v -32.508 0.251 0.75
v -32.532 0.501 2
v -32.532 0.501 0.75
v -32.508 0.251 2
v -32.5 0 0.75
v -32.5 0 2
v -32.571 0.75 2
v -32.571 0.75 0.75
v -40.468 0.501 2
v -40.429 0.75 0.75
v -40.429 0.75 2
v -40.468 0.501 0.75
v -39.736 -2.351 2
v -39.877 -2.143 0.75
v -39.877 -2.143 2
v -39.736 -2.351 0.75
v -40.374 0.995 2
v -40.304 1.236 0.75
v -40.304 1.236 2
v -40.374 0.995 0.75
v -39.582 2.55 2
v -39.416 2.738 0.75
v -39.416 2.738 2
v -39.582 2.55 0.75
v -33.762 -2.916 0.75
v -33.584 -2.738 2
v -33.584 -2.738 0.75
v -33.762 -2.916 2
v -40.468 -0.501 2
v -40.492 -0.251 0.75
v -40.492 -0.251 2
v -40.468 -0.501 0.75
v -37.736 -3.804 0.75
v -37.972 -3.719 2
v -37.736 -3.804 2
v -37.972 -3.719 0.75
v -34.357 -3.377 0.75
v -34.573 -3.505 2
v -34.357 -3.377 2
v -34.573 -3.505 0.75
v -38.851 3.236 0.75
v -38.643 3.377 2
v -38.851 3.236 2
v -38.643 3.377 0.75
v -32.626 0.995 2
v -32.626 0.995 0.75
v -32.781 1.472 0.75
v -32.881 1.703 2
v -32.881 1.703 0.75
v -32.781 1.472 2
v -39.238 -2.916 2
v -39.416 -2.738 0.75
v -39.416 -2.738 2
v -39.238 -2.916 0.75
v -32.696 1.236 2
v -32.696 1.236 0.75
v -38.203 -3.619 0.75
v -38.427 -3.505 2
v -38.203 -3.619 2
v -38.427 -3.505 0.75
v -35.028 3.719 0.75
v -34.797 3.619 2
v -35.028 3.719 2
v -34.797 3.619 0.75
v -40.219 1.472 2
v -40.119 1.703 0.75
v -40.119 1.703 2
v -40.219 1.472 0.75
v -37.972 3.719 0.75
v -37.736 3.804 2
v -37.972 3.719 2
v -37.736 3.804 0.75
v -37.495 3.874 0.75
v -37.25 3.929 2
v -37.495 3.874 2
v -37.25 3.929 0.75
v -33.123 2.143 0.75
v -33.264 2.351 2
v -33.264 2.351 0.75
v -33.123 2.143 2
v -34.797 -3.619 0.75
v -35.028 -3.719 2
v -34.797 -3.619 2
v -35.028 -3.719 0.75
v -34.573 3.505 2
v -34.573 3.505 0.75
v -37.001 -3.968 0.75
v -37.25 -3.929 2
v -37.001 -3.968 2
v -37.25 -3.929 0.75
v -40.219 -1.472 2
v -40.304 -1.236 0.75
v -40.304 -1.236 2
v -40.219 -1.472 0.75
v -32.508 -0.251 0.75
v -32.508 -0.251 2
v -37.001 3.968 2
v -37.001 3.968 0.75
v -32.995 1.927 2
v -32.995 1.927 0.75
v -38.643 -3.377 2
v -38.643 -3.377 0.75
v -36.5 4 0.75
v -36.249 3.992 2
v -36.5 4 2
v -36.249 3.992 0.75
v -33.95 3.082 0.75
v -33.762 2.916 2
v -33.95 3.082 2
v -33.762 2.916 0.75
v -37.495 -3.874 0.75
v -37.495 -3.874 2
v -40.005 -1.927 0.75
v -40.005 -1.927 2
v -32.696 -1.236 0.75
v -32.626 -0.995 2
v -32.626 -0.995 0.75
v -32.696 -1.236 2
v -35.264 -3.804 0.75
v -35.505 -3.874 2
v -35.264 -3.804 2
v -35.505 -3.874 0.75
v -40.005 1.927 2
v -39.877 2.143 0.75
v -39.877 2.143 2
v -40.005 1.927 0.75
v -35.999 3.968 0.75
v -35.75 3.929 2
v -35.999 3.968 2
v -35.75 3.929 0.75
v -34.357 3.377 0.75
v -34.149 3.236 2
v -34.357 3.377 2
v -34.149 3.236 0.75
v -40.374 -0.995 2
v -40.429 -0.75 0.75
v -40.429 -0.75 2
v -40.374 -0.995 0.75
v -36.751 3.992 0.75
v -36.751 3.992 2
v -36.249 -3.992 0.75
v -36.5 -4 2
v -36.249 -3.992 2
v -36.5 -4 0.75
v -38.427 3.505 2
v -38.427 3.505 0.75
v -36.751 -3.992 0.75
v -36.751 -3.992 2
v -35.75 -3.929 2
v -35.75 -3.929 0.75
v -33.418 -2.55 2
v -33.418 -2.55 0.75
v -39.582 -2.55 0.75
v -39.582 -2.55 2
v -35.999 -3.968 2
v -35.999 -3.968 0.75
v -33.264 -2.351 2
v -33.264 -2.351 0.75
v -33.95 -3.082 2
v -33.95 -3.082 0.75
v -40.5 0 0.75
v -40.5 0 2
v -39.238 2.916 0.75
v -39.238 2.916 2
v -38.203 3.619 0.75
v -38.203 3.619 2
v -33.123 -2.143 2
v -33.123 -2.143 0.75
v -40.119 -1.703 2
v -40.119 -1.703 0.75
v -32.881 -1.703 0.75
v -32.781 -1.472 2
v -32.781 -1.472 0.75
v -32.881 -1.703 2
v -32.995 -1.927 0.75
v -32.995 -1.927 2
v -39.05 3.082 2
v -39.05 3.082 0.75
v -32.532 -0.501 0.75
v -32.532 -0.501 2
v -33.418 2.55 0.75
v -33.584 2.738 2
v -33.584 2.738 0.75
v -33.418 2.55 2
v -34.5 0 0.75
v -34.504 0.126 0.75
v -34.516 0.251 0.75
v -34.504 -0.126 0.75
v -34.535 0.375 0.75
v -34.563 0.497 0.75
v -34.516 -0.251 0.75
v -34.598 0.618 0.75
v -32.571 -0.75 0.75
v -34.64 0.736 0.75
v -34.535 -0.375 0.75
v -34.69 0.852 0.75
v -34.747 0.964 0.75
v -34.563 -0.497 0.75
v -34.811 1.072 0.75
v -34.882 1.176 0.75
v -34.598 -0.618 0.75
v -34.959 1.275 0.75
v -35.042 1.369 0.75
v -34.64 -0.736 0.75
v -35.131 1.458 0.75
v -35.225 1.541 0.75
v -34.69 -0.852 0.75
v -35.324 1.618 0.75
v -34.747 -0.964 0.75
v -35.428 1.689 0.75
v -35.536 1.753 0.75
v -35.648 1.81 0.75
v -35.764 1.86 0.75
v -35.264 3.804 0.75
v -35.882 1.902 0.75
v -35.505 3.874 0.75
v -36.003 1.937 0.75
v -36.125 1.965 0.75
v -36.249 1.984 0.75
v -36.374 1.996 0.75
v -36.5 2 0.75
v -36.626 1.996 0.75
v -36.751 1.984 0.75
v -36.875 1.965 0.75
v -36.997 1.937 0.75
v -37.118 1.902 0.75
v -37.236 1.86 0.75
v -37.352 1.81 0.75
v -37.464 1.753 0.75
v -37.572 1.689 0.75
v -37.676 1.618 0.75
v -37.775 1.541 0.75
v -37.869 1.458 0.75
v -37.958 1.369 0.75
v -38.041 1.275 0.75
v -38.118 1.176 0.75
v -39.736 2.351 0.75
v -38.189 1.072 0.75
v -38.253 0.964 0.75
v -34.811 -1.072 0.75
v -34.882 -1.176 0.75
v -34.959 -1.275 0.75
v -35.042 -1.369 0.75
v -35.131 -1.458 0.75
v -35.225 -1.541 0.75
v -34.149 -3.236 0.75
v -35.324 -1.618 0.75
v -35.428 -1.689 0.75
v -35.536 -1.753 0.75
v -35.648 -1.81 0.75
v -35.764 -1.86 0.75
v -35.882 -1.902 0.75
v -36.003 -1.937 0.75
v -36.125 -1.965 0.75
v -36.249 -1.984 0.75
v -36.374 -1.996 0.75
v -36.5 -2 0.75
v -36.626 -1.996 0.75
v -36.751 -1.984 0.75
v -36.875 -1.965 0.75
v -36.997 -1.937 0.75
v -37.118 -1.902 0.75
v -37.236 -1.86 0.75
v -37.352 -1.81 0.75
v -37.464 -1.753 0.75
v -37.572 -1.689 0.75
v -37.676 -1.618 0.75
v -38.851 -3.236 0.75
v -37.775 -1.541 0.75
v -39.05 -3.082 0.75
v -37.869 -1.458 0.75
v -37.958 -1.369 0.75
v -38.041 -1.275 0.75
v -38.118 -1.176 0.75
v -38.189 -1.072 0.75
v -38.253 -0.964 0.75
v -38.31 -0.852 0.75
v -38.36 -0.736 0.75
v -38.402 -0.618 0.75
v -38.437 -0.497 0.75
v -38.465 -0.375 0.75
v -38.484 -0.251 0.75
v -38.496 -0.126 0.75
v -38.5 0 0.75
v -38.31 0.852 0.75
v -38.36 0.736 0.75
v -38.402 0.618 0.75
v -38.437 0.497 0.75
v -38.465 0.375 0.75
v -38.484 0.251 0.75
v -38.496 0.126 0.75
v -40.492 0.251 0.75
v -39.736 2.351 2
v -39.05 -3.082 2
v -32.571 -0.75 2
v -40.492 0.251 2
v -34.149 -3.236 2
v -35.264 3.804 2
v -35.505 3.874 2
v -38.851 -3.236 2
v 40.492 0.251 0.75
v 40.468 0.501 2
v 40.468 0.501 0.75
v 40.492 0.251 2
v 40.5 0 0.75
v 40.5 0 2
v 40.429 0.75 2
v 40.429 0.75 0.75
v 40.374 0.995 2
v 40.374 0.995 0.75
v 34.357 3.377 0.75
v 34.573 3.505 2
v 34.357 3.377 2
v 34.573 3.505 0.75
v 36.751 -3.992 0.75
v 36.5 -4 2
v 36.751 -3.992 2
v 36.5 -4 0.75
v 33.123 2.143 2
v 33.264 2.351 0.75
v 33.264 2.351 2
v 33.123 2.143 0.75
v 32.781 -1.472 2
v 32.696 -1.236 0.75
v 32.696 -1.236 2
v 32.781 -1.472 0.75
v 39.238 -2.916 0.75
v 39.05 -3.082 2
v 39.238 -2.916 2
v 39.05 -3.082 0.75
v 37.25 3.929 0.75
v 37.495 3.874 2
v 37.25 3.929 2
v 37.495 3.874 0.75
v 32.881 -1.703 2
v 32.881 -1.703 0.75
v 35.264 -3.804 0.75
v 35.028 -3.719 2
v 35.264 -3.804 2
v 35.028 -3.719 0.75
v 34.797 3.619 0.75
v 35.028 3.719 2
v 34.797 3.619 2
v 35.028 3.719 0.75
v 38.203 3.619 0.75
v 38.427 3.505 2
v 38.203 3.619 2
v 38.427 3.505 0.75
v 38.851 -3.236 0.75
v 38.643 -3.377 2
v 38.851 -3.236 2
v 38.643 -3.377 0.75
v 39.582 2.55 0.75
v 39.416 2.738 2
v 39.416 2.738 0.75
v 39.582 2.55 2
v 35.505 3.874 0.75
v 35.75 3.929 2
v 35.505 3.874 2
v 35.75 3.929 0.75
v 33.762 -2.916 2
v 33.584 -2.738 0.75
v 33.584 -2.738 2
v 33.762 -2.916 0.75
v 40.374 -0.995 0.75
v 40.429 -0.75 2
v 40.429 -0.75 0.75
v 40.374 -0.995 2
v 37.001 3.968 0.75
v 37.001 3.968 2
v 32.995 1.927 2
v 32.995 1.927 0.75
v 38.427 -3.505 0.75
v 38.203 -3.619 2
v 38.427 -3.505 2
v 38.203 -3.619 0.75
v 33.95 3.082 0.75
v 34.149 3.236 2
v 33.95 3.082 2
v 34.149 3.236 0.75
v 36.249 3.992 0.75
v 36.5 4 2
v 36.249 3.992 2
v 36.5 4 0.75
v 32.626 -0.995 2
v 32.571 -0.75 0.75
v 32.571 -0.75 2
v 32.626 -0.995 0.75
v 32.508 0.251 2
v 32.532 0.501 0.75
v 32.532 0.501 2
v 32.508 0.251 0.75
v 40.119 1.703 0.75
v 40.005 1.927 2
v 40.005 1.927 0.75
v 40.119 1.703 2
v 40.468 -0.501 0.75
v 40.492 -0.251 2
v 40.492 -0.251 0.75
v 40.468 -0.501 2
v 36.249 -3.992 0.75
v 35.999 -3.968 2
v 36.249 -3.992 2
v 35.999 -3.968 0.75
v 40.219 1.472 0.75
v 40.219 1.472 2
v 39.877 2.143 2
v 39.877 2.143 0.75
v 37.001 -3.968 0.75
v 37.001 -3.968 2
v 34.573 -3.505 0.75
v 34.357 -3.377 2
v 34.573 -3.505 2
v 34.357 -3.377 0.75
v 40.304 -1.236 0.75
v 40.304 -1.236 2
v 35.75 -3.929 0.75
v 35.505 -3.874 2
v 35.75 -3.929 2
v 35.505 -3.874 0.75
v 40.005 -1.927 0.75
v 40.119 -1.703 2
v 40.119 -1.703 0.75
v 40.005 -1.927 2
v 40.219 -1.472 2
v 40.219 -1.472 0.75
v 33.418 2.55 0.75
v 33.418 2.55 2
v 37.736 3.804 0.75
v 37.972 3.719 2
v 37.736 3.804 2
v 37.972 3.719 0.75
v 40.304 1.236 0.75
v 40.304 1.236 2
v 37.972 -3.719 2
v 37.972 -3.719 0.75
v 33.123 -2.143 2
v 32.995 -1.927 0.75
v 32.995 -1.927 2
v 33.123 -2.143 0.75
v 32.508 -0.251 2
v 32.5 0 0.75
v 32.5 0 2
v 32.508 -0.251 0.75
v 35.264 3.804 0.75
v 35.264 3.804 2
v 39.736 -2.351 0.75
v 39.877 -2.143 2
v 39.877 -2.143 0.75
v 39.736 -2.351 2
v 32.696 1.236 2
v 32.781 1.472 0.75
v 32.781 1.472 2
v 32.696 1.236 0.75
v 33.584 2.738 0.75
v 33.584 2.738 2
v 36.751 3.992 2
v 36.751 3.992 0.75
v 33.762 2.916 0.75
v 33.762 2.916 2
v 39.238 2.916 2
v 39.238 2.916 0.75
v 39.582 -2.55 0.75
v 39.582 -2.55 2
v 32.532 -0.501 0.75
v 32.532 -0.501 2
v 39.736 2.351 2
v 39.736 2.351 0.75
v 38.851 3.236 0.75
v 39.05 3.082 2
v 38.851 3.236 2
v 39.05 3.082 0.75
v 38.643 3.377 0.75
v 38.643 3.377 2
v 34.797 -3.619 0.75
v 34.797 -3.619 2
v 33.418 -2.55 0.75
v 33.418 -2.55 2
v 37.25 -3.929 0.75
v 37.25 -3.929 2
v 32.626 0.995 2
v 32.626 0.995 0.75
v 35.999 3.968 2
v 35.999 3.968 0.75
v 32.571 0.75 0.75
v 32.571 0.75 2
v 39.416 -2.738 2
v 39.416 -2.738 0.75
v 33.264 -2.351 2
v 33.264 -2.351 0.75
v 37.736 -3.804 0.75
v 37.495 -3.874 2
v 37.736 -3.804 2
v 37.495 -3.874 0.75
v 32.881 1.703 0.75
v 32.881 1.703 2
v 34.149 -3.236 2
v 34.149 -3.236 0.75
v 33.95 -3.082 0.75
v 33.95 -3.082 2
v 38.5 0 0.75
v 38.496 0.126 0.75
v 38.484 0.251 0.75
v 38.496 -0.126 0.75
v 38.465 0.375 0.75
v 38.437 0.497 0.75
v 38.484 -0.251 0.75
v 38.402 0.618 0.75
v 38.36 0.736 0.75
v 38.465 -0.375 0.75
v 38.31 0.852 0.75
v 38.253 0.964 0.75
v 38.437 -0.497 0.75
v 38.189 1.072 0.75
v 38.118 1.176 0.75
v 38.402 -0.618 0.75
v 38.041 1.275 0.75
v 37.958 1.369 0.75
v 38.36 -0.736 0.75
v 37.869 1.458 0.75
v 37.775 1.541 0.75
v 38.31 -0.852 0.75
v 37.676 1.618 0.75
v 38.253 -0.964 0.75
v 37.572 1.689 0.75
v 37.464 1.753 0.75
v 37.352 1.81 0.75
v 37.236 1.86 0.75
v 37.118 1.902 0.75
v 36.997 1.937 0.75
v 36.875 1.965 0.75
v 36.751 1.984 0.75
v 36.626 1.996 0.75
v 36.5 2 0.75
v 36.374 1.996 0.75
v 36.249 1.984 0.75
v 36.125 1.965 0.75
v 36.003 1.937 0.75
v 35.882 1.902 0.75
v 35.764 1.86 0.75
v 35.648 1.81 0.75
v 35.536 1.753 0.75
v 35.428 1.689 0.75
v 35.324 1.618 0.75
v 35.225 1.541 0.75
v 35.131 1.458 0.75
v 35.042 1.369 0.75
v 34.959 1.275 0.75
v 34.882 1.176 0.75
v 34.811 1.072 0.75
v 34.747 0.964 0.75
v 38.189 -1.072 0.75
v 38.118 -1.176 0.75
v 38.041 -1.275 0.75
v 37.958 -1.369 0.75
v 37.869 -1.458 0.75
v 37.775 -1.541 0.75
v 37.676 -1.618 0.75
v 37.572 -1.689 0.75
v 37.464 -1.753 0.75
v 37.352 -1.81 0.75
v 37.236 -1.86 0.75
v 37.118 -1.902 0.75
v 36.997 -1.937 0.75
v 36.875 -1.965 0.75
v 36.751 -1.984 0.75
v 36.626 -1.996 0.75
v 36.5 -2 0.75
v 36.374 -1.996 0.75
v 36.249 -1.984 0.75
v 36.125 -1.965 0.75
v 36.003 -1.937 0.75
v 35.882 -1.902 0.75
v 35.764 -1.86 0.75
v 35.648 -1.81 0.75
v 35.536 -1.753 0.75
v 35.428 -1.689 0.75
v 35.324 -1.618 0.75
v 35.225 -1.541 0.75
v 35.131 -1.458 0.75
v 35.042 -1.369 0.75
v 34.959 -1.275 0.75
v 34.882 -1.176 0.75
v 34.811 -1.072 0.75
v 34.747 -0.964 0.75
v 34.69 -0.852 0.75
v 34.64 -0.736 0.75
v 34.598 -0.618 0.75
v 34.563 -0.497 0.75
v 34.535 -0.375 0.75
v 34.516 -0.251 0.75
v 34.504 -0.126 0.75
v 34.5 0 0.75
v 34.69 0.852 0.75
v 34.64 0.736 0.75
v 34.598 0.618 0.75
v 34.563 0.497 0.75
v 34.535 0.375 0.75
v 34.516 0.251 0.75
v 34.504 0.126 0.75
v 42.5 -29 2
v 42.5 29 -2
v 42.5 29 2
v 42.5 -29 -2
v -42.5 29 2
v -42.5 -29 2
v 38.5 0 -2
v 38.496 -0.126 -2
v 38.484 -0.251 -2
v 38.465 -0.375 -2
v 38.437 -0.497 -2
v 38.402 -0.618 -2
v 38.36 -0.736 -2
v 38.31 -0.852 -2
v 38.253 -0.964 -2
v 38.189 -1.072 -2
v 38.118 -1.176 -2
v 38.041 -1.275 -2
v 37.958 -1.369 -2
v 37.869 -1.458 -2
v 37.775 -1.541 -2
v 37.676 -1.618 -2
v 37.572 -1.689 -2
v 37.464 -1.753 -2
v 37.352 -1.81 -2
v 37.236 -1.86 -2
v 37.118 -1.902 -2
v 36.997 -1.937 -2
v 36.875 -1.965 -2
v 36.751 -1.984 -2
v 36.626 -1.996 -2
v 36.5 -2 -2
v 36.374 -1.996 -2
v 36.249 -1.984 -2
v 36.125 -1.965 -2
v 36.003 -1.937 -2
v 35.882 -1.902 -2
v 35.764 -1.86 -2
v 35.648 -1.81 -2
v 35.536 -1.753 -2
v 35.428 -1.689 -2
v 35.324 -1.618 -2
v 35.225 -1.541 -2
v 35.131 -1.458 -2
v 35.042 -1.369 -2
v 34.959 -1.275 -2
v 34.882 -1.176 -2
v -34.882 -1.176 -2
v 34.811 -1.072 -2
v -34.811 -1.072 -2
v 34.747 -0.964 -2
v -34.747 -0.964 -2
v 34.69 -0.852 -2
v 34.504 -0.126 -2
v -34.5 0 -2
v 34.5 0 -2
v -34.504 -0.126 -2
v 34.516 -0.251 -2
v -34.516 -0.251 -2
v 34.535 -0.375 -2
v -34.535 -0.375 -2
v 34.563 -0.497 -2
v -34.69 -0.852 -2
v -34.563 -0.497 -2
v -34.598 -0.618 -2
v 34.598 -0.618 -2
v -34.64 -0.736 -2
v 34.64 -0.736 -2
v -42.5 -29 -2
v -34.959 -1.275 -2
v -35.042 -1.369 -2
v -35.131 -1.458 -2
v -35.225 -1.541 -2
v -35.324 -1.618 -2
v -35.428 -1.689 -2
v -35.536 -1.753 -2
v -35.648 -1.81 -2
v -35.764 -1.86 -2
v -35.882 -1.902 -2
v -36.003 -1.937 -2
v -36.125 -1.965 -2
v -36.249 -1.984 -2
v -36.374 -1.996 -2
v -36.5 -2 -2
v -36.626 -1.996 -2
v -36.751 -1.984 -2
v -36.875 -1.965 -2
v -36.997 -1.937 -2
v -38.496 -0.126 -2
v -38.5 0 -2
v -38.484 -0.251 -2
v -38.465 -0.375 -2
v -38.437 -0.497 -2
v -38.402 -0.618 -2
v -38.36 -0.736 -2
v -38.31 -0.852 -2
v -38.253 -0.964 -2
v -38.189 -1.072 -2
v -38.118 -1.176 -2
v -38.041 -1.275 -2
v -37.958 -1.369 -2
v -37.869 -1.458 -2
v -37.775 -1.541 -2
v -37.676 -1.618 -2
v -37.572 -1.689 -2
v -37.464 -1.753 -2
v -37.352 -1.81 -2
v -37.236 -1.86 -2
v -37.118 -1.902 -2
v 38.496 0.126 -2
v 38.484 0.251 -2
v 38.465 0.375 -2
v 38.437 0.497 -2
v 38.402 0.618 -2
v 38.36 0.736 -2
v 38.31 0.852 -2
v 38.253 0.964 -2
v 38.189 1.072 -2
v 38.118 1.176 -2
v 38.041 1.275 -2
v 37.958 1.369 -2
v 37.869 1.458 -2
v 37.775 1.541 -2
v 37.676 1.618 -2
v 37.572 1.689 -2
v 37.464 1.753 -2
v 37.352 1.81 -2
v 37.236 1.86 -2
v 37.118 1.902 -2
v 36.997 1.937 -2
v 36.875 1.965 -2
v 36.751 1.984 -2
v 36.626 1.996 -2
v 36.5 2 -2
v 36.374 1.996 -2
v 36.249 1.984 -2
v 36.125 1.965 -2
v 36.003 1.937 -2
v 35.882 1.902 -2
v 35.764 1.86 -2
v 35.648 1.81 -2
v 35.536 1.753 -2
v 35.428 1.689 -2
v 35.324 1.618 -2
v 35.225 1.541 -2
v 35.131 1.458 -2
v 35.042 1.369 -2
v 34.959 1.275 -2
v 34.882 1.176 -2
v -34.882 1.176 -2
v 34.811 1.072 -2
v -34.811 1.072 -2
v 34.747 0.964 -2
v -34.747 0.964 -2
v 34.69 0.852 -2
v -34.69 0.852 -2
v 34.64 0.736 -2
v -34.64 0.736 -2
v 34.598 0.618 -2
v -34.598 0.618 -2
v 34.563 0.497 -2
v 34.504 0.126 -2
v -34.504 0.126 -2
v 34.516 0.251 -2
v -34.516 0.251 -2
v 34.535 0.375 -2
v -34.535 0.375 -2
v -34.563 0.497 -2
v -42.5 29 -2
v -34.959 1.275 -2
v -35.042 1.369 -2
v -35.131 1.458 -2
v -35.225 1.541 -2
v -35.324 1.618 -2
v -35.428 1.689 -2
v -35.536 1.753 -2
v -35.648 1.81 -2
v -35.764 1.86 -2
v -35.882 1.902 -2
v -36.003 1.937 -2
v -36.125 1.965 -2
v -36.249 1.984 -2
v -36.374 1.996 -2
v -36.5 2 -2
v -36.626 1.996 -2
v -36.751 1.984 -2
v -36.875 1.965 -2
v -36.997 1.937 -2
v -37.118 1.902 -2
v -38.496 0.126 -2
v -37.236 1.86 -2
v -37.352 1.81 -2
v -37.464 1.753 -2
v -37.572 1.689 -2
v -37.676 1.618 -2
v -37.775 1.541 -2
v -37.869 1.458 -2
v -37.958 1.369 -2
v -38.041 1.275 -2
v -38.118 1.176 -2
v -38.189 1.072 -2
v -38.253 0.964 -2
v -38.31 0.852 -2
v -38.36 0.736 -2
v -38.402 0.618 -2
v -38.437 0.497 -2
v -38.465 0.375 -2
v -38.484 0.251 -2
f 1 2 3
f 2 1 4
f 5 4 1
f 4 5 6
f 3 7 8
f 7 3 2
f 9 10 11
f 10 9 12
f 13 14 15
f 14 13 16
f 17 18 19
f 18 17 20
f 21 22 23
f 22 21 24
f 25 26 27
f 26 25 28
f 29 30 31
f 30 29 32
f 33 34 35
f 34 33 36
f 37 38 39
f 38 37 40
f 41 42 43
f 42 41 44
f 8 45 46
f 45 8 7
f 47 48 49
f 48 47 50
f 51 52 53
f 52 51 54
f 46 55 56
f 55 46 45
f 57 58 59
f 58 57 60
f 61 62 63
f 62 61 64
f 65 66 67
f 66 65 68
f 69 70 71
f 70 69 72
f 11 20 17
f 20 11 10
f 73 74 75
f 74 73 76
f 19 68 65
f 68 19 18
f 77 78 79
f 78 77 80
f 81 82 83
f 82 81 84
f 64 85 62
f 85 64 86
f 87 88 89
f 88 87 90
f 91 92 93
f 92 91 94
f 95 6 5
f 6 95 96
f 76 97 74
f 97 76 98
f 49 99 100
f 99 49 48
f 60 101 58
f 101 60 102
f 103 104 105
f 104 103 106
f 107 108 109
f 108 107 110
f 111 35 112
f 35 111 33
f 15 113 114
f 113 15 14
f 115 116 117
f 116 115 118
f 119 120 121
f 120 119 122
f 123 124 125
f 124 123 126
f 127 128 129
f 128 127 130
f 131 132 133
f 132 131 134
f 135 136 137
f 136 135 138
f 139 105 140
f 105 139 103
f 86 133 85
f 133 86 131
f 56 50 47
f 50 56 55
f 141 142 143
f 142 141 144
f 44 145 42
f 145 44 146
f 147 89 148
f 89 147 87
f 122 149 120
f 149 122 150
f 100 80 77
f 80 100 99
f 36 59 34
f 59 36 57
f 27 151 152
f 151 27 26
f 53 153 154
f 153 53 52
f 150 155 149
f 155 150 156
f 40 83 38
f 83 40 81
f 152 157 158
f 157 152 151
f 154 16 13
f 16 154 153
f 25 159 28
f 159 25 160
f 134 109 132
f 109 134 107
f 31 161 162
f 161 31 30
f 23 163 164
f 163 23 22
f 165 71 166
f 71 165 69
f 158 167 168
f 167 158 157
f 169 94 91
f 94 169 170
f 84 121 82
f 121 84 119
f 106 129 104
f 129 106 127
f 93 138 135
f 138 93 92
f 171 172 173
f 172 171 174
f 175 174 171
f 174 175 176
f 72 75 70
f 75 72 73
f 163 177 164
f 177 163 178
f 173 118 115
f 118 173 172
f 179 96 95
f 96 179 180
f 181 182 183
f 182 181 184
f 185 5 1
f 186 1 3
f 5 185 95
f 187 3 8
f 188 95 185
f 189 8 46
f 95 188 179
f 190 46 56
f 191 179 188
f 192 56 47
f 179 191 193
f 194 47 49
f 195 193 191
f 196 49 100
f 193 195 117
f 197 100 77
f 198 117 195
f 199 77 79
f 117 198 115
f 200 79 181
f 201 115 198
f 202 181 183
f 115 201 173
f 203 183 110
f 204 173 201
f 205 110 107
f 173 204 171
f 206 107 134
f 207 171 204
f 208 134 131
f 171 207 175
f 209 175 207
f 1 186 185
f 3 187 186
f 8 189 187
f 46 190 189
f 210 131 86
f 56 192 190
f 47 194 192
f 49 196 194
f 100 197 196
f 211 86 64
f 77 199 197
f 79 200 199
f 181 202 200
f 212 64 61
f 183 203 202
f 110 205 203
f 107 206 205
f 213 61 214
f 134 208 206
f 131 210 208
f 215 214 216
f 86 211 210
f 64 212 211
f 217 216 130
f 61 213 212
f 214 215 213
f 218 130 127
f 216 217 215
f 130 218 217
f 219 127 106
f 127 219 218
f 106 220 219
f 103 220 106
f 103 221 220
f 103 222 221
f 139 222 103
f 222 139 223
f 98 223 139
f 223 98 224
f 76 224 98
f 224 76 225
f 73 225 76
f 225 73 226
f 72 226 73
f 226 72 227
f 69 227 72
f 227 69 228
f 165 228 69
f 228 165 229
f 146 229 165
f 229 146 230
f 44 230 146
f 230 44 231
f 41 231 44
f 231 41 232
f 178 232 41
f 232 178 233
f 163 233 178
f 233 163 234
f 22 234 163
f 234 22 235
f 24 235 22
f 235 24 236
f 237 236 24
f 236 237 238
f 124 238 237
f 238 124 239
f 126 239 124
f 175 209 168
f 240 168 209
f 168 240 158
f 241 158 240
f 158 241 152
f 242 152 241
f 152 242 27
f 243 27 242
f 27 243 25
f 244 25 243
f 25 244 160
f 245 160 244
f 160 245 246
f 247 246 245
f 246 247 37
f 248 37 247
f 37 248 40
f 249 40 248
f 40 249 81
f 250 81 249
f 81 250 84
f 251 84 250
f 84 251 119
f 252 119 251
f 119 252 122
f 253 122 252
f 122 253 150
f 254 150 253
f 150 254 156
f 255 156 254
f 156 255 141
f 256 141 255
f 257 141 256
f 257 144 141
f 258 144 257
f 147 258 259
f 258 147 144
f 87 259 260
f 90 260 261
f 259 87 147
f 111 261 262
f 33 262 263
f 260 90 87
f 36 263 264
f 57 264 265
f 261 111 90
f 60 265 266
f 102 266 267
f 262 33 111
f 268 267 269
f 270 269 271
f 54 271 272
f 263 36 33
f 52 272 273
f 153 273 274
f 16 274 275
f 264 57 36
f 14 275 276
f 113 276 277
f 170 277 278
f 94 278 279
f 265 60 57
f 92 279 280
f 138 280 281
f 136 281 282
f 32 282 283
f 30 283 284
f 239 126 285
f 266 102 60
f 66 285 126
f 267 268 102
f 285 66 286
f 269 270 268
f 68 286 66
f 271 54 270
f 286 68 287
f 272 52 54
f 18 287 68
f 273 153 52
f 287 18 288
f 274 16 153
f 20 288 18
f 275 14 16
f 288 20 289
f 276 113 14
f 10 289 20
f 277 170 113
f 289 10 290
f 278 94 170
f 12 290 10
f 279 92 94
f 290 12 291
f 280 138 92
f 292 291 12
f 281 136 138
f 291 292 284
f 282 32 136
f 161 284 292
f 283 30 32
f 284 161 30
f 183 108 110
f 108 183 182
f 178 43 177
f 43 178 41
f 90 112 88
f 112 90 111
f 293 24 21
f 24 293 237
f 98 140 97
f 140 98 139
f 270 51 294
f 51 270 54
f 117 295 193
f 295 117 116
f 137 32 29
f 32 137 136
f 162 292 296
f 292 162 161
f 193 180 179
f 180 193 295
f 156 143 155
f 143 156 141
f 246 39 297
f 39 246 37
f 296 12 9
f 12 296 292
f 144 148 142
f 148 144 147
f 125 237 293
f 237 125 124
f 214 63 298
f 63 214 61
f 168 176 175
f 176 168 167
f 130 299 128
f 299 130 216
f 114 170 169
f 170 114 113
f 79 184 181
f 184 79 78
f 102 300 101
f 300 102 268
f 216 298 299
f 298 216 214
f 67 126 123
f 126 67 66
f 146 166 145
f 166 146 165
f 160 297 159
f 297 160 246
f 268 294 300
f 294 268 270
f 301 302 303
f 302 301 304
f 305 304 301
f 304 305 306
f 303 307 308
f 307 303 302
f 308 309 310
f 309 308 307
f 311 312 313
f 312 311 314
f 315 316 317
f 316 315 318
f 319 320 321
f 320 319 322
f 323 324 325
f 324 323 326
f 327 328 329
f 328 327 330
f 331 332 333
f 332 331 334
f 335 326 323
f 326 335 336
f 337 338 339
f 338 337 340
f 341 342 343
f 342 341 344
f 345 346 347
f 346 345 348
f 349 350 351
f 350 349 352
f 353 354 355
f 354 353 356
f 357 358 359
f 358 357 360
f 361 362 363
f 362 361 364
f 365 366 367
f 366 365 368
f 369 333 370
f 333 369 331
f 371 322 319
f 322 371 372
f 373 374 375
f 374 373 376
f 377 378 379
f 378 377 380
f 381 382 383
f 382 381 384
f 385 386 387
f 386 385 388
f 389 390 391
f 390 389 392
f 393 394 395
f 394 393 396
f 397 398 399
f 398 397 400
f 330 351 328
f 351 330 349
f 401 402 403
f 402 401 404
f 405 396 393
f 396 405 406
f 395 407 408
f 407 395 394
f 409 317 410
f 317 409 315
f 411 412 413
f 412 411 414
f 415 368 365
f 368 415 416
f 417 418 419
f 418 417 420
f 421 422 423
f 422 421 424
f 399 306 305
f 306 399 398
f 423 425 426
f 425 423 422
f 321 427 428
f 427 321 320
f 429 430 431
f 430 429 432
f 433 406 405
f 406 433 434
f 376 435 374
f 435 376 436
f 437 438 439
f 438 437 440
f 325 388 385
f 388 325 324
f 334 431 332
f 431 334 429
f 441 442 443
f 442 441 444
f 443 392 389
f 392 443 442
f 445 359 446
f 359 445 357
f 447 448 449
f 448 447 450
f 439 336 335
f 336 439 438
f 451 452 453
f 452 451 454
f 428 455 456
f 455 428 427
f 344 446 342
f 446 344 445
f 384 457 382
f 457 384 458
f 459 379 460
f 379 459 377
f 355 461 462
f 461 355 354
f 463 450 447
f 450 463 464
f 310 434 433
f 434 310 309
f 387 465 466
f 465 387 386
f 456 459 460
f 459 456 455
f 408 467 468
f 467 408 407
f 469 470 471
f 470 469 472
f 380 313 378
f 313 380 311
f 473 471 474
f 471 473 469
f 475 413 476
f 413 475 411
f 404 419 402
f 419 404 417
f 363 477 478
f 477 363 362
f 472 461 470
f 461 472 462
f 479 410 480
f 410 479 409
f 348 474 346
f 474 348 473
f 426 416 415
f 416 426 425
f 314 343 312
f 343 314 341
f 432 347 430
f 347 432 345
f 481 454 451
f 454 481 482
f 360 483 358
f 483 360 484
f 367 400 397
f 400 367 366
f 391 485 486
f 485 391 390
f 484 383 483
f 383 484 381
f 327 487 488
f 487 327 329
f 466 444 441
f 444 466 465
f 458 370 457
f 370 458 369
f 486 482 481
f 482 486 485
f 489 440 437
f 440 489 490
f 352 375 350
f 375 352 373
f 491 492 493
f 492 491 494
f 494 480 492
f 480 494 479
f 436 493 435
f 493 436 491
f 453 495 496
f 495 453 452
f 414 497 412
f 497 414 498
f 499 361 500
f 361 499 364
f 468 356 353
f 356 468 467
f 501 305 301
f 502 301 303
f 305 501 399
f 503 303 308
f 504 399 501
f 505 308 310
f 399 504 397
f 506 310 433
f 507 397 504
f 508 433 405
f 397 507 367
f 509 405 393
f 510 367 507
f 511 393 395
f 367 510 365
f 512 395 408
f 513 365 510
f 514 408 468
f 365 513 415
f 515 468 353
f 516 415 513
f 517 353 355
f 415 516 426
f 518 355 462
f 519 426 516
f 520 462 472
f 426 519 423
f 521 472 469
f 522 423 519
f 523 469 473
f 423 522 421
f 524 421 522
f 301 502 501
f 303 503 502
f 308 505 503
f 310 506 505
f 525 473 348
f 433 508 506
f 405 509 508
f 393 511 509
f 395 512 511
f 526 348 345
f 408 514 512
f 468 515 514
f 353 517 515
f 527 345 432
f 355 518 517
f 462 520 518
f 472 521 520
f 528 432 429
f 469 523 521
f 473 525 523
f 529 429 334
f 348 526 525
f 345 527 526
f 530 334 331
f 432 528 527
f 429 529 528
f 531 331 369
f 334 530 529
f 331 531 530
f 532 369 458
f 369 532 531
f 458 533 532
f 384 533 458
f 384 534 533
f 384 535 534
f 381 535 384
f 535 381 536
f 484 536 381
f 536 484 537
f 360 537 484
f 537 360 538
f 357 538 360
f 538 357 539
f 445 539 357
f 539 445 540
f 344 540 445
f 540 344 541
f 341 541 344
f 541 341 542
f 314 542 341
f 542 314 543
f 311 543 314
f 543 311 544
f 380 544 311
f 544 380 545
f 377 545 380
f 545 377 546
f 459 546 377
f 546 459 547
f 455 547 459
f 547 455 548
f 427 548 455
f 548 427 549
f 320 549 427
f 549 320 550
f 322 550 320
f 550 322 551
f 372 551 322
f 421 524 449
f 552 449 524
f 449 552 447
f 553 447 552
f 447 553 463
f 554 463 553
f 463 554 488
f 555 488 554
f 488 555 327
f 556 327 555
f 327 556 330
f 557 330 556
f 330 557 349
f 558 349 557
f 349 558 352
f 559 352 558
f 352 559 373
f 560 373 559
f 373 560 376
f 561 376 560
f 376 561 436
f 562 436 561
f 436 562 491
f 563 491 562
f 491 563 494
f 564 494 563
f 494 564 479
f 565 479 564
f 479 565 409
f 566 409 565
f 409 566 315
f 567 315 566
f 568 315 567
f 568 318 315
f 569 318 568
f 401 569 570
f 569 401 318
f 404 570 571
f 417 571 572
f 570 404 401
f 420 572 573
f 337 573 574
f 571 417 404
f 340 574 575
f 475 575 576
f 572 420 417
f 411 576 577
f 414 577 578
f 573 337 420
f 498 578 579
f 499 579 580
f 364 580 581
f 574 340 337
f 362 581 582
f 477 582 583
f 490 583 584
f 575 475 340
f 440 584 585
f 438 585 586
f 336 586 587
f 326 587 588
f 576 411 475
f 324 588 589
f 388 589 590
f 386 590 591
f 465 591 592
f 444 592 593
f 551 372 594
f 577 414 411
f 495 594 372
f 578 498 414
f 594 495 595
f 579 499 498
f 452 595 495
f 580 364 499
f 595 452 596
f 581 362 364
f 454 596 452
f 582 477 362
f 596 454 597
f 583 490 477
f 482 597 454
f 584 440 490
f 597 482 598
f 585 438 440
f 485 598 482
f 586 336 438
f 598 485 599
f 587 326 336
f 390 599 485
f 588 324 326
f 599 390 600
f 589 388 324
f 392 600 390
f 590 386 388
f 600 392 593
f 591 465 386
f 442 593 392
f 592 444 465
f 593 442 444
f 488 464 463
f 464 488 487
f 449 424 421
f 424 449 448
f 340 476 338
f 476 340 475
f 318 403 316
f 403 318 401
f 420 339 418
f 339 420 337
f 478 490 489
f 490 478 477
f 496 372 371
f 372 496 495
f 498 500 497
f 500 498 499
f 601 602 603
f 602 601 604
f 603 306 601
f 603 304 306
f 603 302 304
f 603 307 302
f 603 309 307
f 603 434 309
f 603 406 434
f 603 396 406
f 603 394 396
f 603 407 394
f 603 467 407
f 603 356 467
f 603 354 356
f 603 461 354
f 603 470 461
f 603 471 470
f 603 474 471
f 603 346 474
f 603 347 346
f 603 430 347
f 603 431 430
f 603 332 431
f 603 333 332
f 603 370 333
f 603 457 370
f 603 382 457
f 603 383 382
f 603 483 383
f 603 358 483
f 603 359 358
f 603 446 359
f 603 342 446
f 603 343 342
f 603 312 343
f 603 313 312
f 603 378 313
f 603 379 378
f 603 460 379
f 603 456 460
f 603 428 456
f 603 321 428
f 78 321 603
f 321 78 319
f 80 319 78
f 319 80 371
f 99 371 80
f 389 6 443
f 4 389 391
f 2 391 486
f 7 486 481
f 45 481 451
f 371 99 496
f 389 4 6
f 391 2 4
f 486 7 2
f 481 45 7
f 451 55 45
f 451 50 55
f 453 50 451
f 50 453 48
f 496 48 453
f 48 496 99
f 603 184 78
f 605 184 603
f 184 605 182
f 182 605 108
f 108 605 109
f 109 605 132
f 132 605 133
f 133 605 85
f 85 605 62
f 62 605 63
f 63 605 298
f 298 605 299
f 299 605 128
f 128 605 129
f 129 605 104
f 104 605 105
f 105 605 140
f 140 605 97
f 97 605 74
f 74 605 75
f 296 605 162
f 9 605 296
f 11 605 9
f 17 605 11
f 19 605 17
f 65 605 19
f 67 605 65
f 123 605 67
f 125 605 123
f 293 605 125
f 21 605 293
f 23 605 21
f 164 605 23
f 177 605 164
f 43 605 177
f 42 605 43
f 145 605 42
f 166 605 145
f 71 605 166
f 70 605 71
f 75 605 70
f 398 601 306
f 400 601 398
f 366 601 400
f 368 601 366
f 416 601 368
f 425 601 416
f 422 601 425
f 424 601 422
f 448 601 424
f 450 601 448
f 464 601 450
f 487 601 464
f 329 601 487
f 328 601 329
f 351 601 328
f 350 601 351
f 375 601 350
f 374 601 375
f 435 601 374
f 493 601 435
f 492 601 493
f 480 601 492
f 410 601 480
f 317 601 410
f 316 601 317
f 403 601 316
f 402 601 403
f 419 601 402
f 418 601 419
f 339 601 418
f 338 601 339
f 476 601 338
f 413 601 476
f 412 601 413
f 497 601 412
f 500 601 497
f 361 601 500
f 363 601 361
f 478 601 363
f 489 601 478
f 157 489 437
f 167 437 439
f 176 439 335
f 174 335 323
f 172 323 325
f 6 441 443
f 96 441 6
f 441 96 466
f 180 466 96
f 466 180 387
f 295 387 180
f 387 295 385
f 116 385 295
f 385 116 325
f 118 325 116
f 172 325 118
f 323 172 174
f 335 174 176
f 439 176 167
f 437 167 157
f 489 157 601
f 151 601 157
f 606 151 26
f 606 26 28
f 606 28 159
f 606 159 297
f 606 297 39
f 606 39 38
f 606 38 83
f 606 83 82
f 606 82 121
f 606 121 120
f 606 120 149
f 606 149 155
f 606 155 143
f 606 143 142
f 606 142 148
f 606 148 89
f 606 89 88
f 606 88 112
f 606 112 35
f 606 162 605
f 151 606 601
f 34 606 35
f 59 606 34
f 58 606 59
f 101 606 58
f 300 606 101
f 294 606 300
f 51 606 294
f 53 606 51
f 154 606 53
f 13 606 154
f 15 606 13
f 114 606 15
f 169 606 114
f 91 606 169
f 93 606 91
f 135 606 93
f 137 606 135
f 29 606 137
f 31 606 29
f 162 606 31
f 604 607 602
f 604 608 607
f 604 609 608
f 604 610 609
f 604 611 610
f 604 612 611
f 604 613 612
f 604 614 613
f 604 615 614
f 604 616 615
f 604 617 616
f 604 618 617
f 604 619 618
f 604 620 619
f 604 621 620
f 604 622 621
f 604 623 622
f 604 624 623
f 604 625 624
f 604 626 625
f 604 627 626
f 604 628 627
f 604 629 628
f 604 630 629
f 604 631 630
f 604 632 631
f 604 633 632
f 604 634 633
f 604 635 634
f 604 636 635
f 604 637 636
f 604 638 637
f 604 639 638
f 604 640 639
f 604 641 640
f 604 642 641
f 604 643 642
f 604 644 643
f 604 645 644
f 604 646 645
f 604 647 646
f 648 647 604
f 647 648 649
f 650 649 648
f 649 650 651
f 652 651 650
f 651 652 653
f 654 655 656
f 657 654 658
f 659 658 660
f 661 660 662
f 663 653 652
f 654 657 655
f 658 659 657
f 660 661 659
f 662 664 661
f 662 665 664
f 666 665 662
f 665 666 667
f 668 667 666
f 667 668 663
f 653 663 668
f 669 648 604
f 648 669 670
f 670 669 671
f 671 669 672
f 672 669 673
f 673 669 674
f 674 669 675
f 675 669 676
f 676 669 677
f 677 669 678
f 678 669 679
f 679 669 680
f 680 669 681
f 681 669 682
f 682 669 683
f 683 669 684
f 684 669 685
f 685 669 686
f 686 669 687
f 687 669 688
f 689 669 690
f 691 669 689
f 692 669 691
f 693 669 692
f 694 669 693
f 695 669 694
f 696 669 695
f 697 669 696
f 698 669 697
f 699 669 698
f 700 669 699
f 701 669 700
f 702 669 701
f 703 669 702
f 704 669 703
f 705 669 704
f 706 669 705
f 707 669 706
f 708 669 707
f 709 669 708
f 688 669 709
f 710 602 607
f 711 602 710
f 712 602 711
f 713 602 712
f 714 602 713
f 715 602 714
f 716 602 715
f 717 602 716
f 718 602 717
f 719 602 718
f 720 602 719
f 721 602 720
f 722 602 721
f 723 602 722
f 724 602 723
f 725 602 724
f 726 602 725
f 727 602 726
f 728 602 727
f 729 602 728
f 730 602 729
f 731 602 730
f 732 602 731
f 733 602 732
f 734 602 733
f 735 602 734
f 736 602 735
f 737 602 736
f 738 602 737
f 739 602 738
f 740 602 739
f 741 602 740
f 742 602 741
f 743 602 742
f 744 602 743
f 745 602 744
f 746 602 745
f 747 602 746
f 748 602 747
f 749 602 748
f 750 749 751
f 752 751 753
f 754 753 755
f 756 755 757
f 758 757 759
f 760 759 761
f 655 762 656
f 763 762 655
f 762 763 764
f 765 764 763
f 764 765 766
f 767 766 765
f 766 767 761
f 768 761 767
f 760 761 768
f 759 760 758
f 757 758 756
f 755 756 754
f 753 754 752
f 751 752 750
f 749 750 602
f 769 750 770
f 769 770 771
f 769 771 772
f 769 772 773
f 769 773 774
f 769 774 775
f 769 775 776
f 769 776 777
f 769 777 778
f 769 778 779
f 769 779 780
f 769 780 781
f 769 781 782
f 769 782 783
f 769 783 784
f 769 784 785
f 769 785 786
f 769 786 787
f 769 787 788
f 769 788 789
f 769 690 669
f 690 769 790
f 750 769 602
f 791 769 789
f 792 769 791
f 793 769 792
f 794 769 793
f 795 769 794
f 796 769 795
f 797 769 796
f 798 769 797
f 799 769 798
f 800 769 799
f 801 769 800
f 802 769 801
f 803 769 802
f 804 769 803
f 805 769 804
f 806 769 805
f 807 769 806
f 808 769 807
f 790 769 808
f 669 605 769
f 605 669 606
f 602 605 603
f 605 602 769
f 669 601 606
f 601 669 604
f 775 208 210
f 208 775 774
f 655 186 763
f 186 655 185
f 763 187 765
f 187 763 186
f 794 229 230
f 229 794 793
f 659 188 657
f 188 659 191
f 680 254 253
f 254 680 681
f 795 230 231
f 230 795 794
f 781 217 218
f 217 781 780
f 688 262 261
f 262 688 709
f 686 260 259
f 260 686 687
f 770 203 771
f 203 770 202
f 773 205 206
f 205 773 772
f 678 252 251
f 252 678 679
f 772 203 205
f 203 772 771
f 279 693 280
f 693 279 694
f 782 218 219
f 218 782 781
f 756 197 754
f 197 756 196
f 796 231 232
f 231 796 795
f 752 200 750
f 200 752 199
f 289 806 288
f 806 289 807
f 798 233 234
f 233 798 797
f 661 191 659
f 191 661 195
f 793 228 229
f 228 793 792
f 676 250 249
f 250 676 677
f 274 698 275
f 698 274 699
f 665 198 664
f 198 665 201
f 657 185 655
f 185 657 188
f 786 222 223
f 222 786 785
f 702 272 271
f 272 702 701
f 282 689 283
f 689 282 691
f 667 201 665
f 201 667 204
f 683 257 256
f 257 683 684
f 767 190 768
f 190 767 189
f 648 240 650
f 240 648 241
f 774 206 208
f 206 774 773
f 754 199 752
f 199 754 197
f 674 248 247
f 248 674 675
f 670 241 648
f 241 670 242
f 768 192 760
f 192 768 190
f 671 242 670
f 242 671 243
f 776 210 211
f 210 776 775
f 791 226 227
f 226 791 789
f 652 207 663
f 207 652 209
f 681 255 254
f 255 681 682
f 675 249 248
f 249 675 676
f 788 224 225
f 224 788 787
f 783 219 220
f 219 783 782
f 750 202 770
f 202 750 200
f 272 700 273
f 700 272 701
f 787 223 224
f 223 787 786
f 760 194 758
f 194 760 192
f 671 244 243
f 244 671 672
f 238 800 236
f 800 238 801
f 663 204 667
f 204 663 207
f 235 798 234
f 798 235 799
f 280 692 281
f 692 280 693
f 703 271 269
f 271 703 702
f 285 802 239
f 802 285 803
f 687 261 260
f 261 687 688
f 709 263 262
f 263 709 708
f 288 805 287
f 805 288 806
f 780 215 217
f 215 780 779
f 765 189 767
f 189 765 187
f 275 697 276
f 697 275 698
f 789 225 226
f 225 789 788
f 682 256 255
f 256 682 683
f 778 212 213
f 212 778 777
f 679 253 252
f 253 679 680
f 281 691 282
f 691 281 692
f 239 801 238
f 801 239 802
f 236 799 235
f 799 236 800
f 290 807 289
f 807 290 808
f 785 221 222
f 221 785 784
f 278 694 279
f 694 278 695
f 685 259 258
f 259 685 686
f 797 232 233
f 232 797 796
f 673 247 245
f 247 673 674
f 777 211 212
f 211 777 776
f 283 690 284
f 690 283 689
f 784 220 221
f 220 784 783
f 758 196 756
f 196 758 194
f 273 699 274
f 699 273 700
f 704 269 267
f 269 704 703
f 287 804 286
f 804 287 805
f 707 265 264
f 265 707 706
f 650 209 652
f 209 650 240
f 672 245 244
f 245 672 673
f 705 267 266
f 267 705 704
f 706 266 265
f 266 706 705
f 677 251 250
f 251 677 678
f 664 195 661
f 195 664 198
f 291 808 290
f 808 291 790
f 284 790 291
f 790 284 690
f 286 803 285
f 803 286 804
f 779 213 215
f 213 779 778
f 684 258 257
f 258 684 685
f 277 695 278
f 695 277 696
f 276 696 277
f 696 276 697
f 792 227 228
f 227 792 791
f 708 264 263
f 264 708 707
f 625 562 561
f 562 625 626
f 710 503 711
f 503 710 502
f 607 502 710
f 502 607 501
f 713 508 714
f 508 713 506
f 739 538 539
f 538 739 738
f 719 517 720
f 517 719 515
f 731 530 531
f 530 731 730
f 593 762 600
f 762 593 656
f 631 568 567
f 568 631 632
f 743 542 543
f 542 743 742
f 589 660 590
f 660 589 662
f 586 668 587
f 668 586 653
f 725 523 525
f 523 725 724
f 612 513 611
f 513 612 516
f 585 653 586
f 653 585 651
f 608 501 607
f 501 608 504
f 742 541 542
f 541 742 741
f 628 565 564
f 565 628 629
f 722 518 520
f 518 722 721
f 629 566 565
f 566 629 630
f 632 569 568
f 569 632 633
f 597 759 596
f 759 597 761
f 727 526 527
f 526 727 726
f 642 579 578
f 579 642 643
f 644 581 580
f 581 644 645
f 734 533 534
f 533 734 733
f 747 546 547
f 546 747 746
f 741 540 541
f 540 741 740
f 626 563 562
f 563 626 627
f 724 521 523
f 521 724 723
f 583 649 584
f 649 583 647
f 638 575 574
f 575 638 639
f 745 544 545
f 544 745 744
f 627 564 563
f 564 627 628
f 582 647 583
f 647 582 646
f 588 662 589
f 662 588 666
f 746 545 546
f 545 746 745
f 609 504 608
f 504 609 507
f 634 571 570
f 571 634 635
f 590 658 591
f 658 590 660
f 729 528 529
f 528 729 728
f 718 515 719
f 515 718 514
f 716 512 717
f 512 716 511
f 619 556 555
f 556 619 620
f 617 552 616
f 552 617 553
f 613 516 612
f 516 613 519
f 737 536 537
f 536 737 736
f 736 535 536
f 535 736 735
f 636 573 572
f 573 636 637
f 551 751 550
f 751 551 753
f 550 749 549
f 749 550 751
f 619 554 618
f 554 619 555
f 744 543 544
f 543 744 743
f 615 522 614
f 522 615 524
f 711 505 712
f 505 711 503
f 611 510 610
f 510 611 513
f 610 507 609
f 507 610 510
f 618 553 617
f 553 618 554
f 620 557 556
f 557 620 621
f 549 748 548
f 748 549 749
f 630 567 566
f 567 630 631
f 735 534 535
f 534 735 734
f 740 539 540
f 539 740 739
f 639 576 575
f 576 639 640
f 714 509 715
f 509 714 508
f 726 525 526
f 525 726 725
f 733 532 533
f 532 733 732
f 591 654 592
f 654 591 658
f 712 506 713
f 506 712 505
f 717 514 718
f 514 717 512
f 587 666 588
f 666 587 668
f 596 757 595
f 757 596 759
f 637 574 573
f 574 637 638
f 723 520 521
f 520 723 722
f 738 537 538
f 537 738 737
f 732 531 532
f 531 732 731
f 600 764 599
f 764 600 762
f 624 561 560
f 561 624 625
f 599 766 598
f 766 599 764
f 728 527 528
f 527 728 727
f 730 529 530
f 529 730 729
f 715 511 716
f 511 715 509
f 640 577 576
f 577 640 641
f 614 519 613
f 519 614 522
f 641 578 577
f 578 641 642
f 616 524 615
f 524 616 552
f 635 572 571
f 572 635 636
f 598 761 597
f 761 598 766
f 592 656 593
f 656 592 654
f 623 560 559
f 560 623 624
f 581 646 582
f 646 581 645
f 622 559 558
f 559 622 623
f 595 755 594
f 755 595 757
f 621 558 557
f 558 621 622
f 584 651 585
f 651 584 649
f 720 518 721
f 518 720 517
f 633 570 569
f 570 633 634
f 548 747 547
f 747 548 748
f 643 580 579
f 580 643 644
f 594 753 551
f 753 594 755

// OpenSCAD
$fn=100;

backplateHeight=58;
backplateWidth=85;

depth  = 6;
sinkHeight = 3.5;

difference()
{
    cube([backplateWidth, backplateHeight, 4], center = true);
    translate([-backplateWidth / 2 + 6, 0, 0])
        cylinder(depth, r=2, center = true);
    translate([backplateWidth / 2 - 6, 0, 0])
        cylinder(depth, r=2, center = true);
   
    translate([0, 0, depth - sinkHeight])
    {
        translate([-backplateWidth / 2 + 6, 0, 0])
            cylinder(sinkHeight, r=4, center = true);
        translate([backplateWidth / 2 - 6, 0, 0])
            cylinder(sinkHeight, r=4, center = true);
    }

}
